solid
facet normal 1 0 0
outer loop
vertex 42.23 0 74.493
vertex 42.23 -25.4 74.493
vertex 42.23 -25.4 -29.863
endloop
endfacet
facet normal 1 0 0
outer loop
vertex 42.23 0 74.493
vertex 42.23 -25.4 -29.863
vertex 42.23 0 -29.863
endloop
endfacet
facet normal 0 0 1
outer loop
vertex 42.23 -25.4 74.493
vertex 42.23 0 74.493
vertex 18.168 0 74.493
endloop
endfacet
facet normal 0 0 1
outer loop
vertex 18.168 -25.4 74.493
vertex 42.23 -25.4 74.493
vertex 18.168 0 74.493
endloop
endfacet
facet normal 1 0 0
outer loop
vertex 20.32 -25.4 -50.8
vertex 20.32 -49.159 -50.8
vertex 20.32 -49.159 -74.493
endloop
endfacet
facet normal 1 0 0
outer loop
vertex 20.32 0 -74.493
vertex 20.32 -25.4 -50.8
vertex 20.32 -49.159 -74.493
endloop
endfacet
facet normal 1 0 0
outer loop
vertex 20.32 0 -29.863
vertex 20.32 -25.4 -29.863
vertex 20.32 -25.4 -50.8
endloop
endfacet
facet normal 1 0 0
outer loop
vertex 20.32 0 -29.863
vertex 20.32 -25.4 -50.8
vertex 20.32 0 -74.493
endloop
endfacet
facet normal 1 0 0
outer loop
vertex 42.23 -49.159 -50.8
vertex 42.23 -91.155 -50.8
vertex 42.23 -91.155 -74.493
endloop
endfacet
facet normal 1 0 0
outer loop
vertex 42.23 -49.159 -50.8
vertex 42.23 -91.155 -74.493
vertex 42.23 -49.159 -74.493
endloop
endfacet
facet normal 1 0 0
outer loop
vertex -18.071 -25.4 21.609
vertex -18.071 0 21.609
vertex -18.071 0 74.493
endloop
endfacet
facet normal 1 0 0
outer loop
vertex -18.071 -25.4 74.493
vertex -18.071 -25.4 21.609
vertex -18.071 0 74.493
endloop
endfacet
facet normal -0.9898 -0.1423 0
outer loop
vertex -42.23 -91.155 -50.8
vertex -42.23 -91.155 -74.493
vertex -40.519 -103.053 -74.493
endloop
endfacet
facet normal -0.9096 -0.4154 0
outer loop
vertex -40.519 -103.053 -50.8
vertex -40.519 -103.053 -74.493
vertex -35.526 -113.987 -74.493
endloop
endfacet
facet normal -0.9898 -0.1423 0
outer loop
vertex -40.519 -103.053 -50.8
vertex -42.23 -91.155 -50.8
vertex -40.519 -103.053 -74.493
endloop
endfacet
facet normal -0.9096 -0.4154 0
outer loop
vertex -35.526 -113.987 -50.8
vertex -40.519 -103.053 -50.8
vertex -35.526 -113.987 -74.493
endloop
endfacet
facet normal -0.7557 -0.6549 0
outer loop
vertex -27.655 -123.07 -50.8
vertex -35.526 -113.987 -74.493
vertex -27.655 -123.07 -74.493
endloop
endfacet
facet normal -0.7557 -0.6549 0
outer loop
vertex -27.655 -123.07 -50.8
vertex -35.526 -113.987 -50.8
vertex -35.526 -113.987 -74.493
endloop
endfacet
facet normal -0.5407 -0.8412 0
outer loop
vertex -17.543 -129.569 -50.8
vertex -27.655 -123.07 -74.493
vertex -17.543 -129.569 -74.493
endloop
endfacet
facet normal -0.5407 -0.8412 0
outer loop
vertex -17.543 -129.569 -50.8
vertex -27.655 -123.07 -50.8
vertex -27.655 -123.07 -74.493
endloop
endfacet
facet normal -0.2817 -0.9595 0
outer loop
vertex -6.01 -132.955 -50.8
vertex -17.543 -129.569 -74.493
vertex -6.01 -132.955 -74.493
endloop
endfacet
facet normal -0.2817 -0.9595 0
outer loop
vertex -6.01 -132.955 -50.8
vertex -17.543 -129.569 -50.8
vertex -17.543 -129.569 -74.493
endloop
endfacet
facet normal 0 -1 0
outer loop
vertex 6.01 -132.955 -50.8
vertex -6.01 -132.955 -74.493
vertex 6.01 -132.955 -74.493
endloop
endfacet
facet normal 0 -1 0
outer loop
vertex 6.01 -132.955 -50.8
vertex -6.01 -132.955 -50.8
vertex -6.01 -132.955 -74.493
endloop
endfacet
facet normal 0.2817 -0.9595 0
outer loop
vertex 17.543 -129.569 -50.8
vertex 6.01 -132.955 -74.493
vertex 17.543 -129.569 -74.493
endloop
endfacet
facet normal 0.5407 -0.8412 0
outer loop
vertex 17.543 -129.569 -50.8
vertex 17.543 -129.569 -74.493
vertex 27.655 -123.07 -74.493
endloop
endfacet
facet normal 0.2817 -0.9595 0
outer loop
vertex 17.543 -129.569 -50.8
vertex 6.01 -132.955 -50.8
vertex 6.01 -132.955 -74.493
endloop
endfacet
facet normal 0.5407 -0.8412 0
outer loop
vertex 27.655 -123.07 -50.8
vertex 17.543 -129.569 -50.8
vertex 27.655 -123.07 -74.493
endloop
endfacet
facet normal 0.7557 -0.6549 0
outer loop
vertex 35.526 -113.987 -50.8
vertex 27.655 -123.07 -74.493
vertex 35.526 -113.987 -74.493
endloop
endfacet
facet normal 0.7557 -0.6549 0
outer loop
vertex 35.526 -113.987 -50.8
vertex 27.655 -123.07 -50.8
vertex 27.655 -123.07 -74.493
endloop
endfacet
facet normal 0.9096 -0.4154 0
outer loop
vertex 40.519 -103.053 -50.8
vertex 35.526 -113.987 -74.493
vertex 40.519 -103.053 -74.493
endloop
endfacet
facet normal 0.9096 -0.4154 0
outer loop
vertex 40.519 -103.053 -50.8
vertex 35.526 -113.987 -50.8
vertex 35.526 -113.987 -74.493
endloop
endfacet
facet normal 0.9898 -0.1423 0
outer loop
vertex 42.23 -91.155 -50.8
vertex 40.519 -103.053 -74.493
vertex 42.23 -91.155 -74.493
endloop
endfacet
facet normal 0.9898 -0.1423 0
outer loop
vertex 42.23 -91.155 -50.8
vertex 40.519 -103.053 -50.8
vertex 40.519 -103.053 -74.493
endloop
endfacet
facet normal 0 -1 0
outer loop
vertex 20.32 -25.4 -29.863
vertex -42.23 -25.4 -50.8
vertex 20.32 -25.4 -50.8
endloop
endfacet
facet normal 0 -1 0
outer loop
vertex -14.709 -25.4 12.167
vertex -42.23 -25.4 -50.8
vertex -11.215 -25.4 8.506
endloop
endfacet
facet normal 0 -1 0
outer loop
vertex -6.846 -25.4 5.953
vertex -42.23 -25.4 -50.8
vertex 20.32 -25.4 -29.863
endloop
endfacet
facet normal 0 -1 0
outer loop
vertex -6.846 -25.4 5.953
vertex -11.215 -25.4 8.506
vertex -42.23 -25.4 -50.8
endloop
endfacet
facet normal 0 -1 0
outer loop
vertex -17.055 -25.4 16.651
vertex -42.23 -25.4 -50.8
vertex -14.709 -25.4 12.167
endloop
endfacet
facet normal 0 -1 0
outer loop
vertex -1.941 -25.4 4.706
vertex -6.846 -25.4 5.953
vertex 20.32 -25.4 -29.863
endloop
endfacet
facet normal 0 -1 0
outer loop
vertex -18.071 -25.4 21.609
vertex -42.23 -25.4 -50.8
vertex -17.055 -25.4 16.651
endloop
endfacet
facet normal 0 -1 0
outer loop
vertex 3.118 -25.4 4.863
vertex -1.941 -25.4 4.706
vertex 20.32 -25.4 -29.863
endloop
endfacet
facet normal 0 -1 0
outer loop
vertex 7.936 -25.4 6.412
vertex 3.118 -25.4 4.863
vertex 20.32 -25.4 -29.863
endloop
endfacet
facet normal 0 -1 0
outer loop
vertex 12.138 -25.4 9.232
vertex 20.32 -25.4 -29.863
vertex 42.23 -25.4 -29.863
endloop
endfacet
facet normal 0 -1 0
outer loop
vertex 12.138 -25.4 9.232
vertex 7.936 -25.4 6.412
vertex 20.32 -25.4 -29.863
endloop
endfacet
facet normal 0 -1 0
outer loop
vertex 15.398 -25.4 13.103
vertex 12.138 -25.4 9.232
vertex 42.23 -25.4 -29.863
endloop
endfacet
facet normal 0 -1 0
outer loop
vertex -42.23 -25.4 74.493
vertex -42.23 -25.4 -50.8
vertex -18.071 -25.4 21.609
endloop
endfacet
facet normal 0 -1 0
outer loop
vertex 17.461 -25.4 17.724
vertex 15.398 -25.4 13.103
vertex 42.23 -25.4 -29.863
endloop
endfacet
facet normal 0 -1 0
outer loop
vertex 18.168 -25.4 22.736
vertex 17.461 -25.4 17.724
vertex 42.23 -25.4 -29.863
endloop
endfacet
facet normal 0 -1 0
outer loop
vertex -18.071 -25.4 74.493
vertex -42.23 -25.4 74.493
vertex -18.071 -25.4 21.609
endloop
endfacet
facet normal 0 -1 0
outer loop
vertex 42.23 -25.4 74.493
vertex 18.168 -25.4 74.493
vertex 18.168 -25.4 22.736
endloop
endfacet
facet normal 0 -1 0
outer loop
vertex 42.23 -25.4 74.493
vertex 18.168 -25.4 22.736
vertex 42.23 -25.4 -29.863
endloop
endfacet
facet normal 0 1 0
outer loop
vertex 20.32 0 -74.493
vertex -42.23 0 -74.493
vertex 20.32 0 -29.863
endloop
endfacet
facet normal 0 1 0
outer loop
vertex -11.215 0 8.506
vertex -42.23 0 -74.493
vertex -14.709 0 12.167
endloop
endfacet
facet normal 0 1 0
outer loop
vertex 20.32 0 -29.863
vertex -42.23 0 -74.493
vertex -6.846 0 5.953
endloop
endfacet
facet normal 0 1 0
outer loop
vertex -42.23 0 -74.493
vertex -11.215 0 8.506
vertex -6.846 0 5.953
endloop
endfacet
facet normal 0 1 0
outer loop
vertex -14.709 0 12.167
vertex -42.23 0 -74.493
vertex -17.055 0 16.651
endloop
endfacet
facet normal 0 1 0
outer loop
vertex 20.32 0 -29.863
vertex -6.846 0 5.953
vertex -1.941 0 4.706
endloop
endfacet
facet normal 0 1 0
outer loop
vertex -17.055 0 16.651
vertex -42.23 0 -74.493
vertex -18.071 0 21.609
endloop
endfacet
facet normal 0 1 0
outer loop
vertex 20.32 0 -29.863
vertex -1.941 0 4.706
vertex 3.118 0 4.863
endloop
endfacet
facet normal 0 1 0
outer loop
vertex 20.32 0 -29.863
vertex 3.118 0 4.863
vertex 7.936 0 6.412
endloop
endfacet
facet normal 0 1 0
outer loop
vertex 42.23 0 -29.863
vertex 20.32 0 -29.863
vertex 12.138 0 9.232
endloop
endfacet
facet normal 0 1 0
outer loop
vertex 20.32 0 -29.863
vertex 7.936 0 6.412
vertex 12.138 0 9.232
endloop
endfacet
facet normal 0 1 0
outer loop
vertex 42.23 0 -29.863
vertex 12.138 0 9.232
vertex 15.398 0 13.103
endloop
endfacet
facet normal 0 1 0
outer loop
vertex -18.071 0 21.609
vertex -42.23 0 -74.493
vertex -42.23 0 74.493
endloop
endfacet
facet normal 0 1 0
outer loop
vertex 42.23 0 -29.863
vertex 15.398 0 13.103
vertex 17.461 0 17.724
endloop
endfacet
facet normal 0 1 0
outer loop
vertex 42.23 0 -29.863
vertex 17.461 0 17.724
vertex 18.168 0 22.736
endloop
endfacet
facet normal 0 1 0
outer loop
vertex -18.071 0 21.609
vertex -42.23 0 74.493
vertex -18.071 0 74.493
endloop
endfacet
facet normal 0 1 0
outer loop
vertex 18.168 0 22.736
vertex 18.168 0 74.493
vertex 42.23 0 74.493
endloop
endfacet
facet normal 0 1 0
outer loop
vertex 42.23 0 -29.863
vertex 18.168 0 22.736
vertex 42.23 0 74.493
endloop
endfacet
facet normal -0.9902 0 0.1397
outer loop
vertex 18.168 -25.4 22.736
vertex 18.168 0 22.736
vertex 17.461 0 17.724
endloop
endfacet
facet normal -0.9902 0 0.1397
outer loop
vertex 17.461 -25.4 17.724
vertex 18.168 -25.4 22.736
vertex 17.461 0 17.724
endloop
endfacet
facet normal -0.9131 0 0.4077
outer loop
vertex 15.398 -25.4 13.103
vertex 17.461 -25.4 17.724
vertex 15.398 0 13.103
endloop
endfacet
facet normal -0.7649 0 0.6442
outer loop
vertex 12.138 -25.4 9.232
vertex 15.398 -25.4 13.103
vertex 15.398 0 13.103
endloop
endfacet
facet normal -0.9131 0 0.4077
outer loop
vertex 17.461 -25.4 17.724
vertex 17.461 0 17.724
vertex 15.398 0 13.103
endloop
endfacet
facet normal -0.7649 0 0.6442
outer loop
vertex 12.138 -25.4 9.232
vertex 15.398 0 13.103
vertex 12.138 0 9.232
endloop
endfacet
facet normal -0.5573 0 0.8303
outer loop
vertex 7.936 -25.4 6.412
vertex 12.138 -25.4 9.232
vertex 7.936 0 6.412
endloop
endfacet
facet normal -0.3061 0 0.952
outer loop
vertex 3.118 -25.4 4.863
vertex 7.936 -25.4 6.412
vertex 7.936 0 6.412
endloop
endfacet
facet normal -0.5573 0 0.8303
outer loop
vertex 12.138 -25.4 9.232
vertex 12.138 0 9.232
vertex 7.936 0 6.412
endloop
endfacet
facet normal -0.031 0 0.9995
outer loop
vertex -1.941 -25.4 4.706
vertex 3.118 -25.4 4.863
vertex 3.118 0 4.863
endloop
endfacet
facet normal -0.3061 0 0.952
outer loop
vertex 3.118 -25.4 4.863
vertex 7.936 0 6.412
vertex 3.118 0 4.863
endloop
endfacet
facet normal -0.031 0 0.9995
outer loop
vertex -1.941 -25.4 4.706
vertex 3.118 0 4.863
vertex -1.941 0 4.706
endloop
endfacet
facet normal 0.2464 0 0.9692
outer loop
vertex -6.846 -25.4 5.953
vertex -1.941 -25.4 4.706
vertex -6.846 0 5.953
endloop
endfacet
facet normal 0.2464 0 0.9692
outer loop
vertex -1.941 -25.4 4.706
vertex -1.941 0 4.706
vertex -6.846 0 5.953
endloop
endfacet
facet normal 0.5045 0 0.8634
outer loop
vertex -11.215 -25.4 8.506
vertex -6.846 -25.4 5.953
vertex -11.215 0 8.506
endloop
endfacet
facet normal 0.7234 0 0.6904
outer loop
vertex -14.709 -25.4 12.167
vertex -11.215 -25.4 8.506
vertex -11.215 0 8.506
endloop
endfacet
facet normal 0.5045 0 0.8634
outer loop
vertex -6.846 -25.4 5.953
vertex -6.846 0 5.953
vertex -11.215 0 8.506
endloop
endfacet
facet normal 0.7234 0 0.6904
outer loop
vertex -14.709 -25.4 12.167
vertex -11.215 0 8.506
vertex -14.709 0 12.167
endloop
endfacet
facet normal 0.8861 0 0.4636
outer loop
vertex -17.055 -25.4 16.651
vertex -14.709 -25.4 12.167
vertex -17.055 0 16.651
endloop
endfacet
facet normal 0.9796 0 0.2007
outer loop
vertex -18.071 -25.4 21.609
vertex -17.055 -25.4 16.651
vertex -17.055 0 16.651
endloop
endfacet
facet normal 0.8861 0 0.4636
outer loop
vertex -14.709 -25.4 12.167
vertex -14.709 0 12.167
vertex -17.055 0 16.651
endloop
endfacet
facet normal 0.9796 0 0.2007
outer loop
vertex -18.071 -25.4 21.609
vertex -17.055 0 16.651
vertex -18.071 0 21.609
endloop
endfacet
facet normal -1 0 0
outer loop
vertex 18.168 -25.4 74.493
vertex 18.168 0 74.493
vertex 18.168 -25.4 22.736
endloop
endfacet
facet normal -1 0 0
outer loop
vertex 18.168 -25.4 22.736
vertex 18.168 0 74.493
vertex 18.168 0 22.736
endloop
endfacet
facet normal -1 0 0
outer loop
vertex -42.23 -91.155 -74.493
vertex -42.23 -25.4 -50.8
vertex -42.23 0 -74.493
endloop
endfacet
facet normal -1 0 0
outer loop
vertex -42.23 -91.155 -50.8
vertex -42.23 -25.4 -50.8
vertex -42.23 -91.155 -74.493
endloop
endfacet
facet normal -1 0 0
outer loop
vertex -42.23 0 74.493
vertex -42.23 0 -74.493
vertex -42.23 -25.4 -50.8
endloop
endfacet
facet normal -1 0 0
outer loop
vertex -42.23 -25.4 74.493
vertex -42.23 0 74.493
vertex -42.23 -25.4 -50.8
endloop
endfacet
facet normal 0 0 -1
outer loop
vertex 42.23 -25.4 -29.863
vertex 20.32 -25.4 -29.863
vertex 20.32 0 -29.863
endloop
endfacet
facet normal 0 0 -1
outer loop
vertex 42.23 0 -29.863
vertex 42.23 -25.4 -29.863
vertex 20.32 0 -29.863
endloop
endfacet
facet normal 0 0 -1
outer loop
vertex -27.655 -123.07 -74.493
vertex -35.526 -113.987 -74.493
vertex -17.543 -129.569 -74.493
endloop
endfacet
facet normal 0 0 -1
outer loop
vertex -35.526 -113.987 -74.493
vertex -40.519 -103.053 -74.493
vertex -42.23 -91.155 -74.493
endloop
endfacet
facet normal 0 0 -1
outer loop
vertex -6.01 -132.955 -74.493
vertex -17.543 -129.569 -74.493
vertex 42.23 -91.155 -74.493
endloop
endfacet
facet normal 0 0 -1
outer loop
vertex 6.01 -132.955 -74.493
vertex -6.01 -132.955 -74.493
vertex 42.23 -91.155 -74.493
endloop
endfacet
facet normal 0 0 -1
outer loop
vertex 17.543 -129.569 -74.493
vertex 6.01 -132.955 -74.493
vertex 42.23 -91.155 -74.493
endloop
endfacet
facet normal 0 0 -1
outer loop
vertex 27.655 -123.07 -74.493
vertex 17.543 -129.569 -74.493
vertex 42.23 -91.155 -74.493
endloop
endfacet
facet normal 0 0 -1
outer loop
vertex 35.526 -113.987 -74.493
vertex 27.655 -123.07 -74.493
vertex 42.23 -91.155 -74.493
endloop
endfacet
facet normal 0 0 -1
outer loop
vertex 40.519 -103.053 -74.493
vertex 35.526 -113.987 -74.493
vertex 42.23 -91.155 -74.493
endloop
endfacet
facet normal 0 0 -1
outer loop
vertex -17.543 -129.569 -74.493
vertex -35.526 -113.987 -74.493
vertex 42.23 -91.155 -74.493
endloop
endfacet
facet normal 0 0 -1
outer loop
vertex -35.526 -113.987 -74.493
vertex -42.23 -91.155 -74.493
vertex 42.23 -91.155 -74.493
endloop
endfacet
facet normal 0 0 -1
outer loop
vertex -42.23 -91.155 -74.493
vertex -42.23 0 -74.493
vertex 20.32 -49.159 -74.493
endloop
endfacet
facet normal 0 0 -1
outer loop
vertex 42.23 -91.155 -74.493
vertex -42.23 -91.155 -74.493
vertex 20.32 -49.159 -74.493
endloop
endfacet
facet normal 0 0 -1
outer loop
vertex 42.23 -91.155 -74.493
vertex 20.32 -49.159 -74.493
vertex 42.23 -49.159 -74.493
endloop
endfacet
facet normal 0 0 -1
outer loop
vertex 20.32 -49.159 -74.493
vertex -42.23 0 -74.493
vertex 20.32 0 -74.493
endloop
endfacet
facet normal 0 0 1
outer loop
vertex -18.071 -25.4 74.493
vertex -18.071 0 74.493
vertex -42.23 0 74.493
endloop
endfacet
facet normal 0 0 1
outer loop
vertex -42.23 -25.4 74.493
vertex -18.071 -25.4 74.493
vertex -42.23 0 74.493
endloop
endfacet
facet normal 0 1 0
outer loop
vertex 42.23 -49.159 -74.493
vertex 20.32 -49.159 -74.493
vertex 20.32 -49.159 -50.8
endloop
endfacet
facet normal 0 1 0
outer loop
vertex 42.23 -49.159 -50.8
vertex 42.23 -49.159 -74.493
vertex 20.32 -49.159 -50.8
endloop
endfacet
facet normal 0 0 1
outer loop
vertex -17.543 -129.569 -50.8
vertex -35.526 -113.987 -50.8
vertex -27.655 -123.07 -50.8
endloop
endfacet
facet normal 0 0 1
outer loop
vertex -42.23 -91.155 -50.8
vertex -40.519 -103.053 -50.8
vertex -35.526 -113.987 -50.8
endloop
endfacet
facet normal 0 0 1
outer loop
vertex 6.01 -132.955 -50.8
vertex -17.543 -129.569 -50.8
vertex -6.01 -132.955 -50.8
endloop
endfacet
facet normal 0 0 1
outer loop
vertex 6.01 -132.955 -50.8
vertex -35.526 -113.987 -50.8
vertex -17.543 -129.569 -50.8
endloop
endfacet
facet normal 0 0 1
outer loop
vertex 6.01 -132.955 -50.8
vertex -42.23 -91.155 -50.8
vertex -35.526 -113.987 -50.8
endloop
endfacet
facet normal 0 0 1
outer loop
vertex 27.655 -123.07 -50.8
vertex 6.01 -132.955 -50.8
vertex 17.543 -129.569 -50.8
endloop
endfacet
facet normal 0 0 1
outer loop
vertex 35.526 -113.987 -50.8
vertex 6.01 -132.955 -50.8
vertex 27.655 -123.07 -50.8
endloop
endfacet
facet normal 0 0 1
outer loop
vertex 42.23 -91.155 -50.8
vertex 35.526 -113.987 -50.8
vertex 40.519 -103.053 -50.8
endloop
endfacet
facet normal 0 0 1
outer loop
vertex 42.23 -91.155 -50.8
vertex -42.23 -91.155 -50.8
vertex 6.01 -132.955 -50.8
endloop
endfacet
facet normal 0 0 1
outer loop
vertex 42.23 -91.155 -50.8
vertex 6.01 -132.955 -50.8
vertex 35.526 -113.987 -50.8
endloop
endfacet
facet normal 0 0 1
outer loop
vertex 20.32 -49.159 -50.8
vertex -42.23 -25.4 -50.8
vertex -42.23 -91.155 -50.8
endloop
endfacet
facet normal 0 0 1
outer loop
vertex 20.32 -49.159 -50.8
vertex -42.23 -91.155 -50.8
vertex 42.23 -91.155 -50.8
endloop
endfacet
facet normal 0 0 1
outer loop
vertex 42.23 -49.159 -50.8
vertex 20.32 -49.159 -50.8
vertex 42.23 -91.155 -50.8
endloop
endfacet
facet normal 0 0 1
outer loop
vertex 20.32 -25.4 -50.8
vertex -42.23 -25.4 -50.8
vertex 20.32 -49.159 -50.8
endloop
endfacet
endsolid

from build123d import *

# Parameters (mm, degrees)
F1_DEPTH = 25.4
F3_START = -50.8
F3_DEPTH = 23.6925811887
F5_START = 20.32
F4_W     = 61.8592891842
F4_H     = 58.0035075545
F5_DEPTH = 21.9097418118


with BuildPart() as f1:
    # F0 (on Front) → F1 (new body)
    with BuildSketch(Plane.XZ):
        with BuildLine():
            Line((42.2297418118, -74.4925811887), (42.2297418118, 74.4925811887))
            Line((42.2297418118, 74.4925811887), (18.1675682396, 74.4925811887))
            Line((18.1675682396, 74.4925811887), (18.1675682396, 22.7355392748))
            ThreePointArc((18.1675682396, 22.7355392748), (0.5941393293, 4.6073781801), (-18.0712514327, 21.6091079758))
            Line((-18.0712514327, 21.6091079758), (-18.0712514327, 74.4925811887))
            Line((-18.0712514327, 74.4925811887), (-42.2297418118, 74.4925811887))
            Line((-42.2297418118, 74.4925811887), (-42.2297418118, -74.4925811887))
            Line((-42.2297418118, -74.4925811887), (42.2297418118, -74.4925811887))
        make_face()
    extrude(amount=F1_DEPTH)

    # F2 (on Top) → F3 (join)
    with BuildSketch(Plane.XY.offset(F3_START)):
        with BuildLine():
            Line((42.2297418118, -91.1553874612), (42.2297418118, 0))
            Line((42.2297418118, 0), (-42.2297418118, 0))
            Line((-42.2297418118, 0), (-42.2297418118, -91.1553874612))
            ThreePointArc((-42.2297418118, -91.1553874612), (0, -133.3851292729), (42.2297418118, -91.1553874612))
        make_face()
    extrude(amount=-F3_DEPTH)

    # F4 (on Right) → F5 (cut)
    with BuildSketch(Plane.YZ.offset(F5_START)):
        with Locations((-18.2296438143, -58.8643811643)):
            Rectangle(F4_W, F4_H)
    extrude(amount=F5_DEPTH, mode=Mode.SUBTRACT)


solid = f1.part
